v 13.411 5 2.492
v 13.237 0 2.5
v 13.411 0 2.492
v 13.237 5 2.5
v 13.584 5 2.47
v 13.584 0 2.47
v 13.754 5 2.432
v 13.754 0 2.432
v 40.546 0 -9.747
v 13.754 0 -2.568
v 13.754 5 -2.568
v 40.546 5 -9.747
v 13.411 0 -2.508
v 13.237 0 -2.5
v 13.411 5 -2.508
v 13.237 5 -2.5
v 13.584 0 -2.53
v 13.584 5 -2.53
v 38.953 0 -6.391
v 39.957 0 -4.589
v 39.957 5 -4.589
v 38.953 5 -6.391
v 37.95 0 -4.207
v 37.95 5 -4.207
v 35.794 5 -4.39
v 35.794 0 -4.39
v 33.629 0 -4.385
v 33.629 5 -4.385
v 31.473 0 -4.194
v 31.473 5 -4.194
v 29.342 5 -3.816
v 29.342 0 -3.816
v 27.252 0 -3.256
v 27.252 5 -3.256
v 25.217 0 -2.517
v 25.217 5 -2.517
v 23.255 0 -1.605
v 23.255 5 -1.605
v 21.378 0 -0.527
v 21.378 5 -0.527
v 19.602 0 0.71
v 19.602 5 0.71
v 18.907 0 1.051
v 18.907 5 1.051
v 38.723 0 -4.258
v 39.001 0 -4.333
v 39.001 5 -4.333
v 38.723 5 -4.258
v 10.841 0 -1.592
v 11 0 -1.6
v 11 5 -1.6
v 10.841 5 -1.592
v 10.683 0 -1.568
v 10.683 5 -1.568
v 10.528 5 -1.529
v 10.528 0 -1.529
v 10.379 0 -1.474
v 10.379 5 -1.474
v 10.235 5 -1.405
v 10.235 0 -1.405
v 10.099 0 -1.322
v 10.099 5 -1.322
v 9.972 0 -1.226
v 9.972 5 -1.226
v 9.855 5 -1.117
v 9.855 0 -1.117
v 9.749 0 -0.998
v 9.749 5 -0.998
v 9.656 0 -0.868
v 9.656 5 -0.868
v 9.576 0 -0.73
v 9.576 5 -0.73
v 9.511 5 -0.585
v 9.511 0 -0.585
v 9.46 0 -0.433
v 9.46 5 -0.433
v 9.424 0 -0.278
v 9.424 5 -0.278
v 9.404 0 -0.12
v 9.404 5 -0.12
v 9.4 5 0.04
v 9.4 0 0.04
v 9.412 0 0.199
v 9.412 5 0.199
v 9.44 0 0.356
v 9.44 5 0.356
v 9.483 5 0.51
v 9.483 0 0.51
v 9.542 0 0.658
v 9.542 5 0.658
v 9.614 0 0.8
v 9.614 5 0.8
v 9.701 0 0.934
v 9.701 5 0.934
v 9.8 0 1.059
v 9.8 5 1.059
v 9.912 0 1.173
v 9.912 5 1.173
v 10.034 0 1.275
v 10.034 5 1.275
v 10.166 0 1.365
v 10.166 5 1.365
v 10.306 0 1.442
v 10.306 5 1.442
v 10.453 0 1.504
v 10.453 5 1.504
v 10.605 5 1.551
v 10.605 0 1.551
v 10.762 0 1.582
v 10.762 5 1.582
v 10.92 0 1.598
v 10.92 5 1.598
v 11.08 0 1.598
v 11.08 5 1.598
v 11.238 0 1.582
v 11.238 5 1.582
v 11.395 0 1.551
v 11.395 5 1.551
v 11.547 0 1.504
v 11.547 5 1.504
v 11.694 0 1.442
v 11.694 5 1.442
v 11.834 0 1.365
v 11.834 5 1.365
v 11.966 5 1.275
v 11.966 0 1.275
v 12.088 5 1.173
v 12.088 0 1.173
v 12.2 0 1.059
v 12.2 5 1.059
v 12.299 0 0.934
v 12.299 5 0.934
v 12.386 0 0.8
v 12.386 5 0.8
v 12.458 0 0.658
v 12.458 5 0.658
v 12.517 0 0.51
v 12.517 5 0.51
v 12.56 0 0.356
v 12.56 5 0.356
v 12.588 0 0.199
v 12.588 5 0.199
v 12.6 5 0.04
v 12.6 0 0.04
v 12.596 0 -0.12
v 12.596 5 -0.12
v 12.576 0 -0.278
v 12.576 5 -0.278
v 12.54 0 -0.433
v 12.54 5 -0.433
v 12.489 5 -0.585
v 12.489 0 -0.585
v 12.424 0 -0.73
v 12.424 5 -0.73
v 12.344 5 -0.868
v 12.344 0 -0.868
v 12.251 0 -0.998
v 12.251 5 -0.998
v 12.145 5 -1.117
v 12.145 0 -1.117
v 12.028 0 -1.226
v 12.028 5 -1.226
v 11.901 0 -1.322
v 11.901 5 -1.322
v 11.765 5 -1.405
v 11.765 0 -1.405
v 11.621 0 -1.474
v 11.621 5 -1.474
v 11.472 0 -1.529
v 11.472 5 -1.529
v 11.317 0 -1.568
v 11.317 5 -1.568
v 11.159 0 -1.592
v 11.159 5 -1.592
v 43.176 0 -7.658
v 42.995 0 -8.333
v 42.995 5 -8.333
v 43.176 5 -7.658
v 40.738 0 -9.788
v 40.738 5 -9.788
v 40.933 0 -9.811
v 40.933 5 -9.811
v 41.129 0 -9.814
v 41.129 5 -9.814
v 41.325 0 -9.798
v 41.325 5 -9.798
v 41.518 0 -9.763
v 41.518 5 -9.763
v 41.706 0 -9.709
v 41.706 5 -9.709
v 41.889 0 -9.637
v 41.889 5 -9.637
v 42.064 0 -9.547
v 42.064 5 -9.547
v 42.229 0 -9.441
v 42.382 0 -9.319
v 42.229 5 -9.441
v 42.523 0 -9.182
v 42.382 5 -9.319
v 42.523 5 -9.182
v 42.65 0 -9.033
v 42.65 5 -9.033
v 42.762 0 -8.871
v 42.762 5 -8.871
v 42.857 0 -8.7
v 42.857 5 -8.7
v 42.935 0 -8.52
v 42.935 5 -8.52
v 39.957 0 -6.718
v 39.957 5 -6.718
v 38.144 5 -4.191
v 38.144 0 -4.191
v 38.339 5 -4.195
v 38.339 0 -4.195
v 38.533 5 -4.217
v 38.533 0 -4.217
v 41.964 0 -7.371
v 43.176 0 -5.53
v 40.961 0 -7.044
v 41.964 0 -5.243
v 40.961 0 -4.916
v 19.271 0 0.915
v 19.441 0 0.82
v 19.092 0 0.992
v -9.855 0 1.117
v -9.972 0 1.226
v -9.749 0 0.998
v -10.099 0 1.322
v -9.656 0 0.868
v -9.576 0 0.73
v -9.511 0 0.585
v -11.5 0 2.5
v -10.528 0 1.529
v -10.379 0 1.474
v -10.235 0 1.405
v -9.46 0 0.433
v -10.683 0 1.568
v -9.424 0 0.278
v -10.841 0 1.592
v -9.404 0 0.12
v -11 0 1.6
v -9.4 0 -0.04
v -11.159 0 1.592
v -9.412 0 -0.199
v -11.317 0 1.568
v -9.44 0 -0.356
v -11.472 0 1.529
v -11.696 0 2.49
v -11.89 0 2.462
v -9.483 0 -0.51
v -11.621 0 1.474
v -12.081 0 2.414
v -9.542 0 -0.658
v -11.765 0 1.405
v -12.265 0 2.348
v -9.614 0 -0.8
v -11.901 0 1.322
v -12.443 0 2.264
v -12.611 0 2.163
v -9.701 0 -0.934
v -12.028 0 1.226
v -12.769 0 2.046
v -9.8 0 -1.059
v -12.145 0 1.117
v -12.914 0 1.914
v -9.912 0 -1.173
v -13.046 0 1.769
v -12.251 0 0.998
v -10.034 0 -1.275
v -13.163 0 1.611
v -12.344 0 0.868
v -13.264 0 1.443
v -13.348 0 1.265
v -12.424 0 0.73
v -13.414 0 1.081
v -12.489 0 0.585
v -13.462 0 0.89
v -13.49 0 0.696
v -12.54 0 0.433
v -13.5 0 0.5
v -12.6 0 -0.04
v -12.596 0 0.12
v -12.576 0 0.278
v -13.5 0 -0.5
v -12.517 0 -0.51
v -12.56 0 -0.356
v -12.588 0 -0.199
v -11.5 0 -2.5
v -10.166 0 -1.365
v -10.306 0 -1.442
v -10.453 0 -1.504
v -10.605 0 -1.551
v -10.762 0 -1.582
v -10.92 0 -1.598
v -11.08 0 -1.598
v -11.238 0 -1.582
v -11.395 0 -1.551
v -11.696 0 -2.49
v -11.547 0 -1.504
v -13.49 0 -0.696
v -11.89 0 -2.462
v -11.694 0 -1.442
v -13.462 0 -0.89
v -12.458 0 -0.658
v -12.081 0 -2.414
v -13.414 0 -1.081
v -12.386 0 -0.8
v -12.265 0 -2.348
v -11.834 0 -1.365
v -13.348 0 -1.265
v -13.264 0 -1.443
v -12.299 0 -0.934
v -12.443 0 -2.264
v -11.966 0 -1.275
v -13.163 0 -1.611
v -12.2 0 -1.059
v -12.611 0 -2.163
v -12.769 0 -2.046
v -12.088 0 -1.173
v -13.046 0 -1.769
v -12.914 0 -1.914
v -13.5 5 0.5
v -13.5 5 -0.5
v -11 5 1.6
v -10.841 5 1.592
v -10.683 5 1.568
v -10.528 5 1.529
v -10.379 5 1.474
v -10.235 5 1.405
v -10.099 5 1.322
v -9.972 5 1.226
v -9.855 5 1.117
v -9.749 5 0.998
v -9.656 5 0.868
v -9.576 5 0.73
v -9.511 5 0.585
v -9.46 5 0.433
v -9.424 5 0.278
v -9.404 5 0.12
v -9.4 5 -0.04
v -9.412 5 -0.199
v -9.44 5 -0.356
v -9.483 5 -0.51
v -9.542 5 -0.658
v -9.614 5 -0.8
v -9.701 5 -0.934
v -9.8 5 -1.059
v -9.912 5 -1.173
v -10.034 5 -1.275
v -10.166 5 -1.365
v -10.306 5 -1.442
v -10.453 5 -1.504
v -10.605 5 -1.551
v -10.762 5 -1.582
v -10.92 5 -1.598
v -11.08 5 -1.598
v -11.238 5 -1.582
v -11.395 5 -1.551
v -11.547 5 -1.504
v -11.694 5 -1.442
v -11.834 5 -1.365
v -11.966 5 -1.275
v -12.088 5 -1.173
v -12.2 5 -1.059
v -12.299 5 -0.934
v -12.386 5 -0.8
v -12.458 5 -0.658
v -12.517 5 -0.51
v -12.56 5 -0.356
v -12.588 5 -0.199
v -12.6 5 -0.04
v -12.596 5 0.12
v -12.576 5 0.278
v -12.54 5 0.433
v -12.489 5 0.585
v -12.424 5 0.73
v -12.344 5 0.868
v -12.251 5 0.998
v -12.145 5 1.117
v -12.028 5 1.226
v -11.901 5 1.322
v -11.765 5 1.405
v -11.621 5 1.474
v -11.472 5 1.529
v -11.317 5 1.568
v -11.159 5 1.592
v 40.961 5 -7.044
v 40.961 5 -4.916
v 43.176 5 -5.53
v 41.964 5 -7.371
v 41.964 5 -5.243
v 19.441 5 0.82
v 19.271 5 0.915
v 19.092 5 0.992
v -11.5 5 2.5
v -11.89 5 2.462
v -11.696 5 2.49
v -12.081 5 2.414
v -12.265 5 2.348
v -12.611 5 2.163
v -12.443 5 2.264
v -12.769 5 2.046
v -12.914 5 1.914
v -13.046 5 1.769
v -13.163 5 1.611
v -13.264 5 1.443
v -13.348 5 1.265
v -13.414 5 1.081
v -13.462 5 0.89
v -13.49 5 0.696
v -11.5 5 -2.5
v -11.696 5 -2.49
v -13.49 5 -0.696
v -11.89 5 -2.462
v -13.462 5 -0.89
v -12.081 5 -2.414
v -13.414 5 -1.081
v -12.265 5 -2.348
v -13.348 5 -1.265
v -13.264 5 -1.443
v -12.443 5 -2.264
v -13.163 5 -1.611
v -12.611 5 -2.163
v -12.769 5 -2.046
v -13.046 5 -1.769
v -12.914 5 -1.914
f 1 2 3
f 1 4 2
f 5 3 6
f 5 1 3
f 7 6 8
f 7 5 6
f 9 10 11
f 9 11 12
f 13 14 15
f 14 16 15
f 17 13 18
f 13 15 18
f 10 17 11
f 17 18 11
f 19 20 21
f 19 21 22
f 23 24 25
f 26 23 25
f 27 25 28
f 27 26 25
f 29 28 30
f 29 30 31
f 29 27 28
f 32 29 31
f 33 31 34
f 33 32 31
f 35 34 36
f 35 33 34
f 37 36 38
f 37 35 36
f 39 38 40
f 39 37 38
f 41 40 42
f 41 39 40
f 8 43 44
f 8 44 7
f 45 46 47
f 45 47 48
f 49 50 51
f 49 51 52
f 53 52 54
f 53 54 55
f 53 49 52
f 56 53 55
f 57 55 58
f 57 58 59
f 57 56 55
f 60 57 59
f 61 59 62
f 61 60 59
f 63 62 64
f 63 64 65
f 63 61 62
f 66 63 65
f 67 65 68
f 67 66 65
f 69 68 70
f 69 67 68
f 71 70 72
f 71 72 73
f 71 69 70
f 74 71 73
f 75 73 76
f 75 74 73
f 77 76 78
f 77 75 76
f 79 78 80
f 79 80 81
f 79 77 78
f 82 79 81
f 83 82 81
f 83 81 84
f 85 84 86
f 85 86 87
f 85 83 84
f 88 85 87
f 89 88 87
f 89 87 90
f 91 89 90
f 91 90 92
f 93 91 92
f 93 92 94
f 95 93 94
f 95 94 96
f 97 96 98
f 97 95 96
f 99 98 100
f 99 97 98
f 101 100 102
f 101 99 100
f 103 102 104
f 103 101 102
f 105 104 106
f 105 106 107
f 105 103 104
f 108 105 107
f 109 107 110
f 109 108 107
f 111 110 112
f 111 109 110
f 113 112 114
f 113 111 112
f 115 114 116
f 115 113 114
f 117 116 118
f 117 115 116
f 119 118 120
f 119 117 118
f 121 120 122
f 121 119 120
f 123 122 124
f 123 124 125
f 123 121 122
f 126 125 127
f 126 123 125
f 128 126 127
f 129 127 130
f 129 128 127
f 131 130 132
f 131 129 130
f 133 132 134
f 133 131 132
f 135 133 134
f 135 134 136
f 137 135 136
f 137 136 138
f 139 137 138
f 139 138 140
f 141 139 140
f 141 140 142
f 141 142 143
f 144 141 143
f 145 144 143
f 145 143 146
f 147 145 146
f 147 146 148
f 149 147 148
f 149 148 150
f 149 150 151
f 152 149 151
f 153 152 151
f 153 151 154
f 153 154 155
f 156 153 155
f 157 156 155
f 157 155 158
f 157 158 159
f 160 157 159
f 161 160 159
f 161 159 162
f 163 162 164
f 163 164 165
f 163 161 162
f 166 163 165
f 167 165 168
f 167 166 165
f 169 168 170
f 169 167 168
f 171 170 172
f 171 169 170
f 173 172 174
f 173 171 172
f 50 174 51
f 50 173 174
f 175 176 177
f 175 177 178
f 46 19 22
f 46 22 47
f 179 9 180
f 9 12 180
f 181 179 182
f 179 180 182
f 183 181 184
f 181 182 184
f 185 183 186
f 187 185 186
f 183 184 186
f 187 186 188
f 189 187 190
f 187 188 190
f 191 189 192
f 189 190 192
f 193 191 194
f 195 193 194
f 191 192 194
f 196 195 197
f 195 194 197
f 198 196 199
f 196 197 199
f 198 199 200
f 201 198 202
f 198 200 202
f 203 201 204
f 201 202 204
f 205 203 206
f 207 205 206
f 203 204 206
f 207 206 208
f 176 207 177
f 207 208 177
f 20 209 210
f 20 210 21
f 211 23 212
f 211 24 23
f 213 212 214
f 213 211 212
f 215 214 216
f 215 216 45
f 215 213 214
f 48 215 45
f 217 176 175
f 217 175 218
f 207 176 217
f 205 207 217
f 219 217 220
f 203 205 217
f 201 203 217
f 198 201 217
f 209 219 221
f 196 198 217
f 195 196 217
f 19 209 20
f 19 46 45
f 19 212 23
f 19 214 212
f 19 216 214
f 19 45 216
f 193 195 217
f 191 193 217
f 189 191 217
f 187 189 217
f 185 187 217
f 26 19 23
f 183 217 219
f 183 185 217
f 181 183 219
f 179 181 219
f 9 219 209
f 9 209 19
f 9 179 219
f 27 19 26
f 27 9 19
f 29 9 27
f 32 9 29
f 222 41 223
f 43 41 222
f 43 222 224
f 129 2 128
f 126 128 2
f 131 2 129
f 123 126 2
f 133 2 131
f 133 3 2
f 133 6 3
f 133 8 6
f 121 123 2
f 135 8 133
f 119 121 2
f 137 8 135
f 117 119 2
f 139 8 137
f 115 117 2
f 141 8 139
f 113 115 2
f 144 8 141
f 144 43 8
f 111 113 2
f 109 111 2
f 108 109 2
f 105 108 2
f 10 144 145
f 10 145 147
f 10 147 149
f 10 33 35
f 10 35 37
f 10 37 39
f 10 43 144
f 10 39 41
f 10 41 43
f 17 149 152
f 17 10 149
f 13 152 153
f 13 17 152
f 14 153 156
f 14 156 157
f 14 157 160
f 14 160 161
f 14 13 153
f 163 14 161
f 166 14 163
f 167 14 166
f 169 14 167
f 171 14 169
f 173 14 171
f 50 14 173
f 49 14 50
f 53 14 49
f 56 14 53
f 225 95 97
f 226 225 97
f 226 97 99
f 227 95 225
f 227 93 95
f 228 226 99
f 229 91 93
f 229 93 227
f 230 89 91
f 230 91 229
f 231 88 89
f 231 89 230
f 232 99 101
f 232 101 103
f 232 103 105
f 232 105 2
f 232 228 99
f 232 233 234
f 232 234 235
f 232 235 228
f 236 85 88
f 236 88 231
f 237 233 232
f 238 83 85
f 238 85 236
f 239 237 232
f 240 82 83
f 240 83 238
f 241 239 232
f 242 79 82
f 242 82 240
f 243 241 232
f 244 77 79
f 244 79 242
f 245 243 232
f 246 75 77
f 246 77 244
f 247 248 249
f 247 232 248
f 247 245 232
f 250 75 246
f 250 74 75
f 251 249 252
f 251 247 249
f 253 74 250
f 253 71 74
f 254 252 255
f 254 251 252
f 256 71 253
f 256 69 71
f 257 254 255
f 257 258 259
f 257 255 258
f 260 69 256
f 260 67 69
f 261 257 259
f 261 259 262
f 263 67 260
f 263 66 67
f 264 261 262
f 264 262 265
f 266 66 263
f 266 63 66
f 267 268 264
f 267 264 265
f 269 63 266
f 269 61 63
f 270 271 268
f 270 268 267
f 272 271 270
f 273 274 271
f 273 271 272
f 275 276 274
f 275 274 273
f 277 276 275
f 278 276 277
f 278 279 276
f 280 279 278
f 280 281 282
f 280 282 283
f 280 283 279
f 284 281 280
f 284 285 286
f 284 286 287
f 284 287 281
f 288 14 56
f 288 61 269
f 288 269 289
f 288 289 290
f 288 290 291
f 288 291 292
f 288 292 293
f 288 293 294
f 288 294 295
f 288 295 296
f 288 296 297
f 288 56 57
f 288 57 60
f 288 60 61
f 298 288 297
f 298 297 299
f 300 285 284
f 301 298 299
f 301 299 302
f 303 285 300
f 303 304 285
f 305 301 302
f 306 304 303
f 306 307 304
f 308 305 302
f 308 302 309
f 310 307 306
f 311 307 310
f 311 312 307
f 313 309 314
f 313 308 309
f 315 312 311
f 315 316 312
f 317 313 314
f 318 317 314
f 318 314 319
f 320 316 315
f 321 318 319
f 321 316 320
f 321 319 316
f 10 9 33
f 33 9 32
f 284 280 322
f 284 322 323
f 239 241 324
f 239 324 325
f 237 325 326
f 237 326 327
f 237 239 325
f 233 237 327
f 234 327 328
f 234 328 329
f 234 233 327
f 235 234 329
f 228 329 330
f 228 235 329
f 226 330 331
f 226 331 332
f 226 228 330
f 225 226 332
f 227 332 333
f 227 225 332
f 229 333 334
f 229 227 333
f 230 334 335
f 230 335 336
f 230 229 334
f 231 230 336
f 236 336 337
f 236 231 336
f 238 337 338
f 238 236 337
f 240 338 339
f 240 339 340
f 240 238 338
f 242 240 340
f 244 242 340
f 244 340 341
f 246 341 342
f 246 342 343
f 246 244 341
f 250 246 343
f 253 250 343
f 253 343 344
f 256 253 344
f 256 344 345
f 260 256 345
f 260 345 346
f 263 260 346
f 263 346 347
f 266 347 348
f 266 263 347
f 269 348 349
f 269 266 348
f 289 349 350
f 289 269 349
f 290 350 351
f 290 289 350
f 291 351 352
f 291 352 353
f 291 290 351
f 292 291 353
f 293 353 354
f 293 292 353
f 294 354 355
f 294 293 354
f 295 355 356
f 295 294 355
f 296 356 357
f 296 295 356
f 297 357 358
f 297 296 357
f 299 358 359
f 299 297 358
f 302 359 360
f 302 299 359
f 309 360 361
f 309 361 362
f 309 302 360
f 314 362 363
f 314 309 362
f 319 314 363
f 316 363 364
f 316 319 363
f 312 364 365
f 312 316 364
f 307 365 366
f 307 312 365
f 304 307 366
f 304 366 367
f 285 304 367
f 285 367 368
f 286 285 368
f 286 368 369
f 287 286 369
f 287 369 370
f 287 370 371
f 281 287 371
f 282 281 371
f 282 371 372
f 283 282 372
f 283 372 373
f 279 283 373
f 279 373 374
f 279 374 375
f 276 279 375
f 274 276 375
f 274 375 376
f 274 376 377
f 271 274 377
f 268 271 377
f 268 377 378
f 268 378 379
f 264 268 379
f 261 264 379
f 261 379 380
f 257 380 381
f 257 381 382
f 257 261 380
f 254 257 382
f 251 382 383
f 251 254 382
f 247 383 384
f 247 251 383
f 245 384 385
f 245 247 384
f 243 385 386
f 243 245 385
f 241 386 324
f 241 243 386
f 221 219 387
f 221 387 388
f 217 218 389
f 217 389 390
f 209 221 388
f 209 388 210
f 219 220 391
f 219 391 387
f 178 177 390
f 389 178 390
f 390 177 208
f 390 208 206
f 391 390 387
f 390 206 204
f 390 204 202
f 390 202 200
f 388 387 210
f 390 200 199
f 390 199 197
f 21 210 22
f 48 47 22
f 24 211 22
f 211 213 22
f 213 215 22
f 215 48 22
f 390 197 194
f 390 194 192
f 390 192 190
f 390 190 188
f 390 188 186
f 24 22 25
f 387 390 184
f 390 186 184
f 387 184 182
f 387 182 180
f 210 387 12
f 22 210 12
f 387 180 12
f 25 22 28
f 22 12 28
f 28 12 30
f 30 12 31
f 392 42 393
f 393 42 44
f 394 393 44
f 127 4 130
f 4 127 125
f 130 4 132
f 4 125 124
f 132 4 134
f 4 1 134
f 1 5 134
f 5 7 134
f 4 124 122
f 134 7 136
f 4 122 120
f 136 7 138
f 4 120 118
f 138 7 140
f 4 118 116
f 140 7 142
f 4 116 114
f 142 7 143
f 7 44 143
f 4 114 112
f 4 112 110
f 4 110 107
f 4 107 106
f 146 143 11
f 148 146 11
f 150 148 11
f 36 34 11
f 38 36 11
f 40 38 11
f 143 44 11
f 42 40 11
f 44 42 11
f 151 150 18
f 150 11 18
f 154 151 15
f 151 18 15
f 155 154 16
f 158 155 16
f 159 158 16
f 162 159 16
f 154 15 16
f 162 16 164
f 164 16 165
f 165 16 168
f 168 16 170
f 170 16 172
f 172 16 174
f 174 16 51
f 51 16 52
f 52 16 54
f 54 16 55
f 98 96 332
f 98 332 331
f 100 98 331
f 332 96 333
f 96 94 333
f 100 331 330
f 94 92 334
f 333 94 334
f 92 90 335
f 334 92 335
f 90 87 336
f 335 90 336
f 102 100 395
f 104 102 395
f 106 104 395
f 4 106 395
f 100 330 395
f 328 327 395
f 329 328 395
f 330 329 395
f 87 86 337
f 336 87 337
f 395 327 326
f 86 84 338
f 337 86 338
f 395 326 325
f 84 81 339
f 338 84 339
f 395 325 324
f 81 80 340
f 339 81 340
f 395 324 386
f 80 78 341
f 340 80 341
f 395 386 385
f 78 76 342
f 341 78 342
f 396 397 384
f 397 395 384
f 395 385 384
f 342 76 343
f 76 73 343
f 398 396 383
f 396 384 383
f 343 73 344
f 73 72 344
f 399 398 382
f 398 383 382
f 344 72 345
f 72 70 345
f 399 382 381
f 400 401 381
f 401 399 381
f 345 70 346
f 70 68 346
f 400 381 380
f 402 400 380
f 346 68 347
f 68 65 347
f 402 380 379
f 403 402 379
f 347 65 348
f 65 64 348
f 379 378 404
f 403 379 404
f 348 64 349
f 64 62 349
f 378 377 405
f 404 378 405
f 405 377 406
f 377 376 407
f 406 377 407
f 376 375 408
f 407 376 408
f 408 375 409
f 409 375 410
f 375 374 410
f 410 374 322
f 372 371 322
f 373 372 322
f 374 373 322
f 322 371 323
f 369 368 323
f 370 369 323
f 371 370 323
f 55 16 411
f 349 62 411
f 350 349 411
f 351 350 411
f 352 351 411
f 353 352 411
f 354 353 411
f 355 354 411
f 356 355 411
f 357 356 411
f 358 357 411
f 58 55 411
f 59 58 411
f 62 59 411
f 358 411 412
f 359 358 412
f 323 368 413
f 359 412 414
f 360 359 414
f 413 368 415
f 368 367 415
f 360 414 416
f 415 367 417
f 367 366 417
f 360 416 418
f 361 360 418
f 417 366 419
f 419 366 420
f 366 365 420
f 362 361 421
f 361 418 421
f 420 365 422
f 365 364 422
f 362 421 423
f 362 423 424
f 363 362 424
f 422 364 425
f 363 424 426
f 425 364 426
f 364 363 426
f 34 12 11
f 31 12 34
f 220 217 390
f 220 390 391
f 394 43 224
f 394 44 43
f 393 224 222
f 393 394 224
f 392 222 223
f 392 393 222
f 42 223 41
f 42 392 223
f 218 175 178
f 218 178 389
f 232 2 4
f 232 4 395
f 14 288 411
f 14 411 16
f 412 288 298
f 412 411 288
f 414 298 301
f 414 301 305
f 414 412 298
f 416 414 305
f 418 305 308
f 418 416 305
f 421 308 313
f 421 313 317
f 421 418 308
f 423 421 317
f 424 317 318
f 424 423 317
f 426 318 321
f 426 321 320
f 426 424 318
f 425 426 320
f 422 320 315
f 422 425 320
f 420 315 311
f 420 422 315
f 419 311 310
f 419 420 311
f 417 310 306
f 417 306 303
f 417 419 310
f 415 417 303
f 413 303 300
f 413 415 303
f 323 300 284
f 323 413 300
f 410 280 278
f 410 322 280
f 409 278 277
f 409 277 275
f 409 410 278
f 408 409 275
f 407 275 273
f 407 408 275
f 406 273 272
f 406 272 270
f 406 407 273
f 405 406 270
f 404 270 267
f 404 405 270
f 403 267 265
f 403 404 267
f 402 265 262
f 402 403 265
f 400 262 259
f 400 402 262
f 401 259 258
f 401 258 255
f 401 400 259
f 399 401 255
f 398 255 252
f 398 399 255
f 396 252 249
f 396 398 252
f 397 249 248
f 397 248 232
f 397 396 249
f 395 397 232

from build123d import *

# Parameters (mm, degrees)
SKETCH_1_R      = 1.6
EXTRUDE_1_DEPTH = 5
FILLET_1_R      = 2


with BuildPart() as part:
    # 草图1 → 凸台-拉伸1 (new body)
    with BuildSketch(Plane(origin=(0, 0, 0), x_dir=(1, 0, 0), z_dir=(0, 1, 0))):
        with BuildLine():
            Line((-13.5, 2.5), (13.5, 2.5))
            Line((13.5, 2.5), (42.477774789, 10.264571353))
            Line((42.477774789, 10.264571353), (43.176188432, 7.65805615))
            Line((43.176188432, 7.65805615), (43.176188432, 5.529700605))
            Line((43.176188432, 5.529700605), (41.964432742, 7.37098368))
            Line((41.964432742, 7.37098368), (41.964432742, 5.242628135))
            Line((41.964432742, 5.242628135), (40.960741016, 7.044242108))
            Line((40.960741016, 7.044242108), (40.960741016, 4.915886563))
            Line((40.960741016, 4.915886563), (39.95704929, 6.717500536))
            Line((39.95704929, 6.717500536), (39.95704929, 4.589144991))
            Line((39.95704929, 4.589144991), (38.953357563, 6.390758965))
            Line((38.953357563, 6.390758965), (39.000927635, 4.332952966))
            Line((39.000927635, 4.332952966), (38.334050279, 4.154263717))
            ThreePointArc((38.334050279, 4.154263717), (28.290848144, 3.559013712), (19.295554958, -0.947085729))
            Line((19.295554958, -0.947085729), (13.5, -2.5))
            Line((13.5, -2.5), (-13.5, -2.5))
            Line((-13.5, -2.5), (-13.5, 2.5))
        make_face()
        with Locations(Location((-11, 0, 0), (0, 0, 270))):
            Circle(SKETCH_1_R, mode=Mode.SUBTRACT)
        with Locations(Location((11, 0, 0), (0, 0, 90))):
            Circle(SKETCH_1_R, mode=Mode.SUBTRACT)
    extrude(amount=EXTRUDE_1_DEPTH)

    # 圆角1
    fillet_1_edges = [part.edges().sort_by_distance(p)[0] for p in [
        (13.5, 2.5, 2.5),
        (-13.5, 2.5, 2.5),
        (-13.5, 2.5, -2.5),
        (13.5, 2.5, -2.5),
        (42.477774789, 2.5, -10.264571353),
        (38.334050279, 2.5, -4.154263717),
        (19.295554958, 2.5, 0.947085729),
    ]]
    fillet(fillet_1_edges, radius=FILLET_1_R)


solid = part.part
